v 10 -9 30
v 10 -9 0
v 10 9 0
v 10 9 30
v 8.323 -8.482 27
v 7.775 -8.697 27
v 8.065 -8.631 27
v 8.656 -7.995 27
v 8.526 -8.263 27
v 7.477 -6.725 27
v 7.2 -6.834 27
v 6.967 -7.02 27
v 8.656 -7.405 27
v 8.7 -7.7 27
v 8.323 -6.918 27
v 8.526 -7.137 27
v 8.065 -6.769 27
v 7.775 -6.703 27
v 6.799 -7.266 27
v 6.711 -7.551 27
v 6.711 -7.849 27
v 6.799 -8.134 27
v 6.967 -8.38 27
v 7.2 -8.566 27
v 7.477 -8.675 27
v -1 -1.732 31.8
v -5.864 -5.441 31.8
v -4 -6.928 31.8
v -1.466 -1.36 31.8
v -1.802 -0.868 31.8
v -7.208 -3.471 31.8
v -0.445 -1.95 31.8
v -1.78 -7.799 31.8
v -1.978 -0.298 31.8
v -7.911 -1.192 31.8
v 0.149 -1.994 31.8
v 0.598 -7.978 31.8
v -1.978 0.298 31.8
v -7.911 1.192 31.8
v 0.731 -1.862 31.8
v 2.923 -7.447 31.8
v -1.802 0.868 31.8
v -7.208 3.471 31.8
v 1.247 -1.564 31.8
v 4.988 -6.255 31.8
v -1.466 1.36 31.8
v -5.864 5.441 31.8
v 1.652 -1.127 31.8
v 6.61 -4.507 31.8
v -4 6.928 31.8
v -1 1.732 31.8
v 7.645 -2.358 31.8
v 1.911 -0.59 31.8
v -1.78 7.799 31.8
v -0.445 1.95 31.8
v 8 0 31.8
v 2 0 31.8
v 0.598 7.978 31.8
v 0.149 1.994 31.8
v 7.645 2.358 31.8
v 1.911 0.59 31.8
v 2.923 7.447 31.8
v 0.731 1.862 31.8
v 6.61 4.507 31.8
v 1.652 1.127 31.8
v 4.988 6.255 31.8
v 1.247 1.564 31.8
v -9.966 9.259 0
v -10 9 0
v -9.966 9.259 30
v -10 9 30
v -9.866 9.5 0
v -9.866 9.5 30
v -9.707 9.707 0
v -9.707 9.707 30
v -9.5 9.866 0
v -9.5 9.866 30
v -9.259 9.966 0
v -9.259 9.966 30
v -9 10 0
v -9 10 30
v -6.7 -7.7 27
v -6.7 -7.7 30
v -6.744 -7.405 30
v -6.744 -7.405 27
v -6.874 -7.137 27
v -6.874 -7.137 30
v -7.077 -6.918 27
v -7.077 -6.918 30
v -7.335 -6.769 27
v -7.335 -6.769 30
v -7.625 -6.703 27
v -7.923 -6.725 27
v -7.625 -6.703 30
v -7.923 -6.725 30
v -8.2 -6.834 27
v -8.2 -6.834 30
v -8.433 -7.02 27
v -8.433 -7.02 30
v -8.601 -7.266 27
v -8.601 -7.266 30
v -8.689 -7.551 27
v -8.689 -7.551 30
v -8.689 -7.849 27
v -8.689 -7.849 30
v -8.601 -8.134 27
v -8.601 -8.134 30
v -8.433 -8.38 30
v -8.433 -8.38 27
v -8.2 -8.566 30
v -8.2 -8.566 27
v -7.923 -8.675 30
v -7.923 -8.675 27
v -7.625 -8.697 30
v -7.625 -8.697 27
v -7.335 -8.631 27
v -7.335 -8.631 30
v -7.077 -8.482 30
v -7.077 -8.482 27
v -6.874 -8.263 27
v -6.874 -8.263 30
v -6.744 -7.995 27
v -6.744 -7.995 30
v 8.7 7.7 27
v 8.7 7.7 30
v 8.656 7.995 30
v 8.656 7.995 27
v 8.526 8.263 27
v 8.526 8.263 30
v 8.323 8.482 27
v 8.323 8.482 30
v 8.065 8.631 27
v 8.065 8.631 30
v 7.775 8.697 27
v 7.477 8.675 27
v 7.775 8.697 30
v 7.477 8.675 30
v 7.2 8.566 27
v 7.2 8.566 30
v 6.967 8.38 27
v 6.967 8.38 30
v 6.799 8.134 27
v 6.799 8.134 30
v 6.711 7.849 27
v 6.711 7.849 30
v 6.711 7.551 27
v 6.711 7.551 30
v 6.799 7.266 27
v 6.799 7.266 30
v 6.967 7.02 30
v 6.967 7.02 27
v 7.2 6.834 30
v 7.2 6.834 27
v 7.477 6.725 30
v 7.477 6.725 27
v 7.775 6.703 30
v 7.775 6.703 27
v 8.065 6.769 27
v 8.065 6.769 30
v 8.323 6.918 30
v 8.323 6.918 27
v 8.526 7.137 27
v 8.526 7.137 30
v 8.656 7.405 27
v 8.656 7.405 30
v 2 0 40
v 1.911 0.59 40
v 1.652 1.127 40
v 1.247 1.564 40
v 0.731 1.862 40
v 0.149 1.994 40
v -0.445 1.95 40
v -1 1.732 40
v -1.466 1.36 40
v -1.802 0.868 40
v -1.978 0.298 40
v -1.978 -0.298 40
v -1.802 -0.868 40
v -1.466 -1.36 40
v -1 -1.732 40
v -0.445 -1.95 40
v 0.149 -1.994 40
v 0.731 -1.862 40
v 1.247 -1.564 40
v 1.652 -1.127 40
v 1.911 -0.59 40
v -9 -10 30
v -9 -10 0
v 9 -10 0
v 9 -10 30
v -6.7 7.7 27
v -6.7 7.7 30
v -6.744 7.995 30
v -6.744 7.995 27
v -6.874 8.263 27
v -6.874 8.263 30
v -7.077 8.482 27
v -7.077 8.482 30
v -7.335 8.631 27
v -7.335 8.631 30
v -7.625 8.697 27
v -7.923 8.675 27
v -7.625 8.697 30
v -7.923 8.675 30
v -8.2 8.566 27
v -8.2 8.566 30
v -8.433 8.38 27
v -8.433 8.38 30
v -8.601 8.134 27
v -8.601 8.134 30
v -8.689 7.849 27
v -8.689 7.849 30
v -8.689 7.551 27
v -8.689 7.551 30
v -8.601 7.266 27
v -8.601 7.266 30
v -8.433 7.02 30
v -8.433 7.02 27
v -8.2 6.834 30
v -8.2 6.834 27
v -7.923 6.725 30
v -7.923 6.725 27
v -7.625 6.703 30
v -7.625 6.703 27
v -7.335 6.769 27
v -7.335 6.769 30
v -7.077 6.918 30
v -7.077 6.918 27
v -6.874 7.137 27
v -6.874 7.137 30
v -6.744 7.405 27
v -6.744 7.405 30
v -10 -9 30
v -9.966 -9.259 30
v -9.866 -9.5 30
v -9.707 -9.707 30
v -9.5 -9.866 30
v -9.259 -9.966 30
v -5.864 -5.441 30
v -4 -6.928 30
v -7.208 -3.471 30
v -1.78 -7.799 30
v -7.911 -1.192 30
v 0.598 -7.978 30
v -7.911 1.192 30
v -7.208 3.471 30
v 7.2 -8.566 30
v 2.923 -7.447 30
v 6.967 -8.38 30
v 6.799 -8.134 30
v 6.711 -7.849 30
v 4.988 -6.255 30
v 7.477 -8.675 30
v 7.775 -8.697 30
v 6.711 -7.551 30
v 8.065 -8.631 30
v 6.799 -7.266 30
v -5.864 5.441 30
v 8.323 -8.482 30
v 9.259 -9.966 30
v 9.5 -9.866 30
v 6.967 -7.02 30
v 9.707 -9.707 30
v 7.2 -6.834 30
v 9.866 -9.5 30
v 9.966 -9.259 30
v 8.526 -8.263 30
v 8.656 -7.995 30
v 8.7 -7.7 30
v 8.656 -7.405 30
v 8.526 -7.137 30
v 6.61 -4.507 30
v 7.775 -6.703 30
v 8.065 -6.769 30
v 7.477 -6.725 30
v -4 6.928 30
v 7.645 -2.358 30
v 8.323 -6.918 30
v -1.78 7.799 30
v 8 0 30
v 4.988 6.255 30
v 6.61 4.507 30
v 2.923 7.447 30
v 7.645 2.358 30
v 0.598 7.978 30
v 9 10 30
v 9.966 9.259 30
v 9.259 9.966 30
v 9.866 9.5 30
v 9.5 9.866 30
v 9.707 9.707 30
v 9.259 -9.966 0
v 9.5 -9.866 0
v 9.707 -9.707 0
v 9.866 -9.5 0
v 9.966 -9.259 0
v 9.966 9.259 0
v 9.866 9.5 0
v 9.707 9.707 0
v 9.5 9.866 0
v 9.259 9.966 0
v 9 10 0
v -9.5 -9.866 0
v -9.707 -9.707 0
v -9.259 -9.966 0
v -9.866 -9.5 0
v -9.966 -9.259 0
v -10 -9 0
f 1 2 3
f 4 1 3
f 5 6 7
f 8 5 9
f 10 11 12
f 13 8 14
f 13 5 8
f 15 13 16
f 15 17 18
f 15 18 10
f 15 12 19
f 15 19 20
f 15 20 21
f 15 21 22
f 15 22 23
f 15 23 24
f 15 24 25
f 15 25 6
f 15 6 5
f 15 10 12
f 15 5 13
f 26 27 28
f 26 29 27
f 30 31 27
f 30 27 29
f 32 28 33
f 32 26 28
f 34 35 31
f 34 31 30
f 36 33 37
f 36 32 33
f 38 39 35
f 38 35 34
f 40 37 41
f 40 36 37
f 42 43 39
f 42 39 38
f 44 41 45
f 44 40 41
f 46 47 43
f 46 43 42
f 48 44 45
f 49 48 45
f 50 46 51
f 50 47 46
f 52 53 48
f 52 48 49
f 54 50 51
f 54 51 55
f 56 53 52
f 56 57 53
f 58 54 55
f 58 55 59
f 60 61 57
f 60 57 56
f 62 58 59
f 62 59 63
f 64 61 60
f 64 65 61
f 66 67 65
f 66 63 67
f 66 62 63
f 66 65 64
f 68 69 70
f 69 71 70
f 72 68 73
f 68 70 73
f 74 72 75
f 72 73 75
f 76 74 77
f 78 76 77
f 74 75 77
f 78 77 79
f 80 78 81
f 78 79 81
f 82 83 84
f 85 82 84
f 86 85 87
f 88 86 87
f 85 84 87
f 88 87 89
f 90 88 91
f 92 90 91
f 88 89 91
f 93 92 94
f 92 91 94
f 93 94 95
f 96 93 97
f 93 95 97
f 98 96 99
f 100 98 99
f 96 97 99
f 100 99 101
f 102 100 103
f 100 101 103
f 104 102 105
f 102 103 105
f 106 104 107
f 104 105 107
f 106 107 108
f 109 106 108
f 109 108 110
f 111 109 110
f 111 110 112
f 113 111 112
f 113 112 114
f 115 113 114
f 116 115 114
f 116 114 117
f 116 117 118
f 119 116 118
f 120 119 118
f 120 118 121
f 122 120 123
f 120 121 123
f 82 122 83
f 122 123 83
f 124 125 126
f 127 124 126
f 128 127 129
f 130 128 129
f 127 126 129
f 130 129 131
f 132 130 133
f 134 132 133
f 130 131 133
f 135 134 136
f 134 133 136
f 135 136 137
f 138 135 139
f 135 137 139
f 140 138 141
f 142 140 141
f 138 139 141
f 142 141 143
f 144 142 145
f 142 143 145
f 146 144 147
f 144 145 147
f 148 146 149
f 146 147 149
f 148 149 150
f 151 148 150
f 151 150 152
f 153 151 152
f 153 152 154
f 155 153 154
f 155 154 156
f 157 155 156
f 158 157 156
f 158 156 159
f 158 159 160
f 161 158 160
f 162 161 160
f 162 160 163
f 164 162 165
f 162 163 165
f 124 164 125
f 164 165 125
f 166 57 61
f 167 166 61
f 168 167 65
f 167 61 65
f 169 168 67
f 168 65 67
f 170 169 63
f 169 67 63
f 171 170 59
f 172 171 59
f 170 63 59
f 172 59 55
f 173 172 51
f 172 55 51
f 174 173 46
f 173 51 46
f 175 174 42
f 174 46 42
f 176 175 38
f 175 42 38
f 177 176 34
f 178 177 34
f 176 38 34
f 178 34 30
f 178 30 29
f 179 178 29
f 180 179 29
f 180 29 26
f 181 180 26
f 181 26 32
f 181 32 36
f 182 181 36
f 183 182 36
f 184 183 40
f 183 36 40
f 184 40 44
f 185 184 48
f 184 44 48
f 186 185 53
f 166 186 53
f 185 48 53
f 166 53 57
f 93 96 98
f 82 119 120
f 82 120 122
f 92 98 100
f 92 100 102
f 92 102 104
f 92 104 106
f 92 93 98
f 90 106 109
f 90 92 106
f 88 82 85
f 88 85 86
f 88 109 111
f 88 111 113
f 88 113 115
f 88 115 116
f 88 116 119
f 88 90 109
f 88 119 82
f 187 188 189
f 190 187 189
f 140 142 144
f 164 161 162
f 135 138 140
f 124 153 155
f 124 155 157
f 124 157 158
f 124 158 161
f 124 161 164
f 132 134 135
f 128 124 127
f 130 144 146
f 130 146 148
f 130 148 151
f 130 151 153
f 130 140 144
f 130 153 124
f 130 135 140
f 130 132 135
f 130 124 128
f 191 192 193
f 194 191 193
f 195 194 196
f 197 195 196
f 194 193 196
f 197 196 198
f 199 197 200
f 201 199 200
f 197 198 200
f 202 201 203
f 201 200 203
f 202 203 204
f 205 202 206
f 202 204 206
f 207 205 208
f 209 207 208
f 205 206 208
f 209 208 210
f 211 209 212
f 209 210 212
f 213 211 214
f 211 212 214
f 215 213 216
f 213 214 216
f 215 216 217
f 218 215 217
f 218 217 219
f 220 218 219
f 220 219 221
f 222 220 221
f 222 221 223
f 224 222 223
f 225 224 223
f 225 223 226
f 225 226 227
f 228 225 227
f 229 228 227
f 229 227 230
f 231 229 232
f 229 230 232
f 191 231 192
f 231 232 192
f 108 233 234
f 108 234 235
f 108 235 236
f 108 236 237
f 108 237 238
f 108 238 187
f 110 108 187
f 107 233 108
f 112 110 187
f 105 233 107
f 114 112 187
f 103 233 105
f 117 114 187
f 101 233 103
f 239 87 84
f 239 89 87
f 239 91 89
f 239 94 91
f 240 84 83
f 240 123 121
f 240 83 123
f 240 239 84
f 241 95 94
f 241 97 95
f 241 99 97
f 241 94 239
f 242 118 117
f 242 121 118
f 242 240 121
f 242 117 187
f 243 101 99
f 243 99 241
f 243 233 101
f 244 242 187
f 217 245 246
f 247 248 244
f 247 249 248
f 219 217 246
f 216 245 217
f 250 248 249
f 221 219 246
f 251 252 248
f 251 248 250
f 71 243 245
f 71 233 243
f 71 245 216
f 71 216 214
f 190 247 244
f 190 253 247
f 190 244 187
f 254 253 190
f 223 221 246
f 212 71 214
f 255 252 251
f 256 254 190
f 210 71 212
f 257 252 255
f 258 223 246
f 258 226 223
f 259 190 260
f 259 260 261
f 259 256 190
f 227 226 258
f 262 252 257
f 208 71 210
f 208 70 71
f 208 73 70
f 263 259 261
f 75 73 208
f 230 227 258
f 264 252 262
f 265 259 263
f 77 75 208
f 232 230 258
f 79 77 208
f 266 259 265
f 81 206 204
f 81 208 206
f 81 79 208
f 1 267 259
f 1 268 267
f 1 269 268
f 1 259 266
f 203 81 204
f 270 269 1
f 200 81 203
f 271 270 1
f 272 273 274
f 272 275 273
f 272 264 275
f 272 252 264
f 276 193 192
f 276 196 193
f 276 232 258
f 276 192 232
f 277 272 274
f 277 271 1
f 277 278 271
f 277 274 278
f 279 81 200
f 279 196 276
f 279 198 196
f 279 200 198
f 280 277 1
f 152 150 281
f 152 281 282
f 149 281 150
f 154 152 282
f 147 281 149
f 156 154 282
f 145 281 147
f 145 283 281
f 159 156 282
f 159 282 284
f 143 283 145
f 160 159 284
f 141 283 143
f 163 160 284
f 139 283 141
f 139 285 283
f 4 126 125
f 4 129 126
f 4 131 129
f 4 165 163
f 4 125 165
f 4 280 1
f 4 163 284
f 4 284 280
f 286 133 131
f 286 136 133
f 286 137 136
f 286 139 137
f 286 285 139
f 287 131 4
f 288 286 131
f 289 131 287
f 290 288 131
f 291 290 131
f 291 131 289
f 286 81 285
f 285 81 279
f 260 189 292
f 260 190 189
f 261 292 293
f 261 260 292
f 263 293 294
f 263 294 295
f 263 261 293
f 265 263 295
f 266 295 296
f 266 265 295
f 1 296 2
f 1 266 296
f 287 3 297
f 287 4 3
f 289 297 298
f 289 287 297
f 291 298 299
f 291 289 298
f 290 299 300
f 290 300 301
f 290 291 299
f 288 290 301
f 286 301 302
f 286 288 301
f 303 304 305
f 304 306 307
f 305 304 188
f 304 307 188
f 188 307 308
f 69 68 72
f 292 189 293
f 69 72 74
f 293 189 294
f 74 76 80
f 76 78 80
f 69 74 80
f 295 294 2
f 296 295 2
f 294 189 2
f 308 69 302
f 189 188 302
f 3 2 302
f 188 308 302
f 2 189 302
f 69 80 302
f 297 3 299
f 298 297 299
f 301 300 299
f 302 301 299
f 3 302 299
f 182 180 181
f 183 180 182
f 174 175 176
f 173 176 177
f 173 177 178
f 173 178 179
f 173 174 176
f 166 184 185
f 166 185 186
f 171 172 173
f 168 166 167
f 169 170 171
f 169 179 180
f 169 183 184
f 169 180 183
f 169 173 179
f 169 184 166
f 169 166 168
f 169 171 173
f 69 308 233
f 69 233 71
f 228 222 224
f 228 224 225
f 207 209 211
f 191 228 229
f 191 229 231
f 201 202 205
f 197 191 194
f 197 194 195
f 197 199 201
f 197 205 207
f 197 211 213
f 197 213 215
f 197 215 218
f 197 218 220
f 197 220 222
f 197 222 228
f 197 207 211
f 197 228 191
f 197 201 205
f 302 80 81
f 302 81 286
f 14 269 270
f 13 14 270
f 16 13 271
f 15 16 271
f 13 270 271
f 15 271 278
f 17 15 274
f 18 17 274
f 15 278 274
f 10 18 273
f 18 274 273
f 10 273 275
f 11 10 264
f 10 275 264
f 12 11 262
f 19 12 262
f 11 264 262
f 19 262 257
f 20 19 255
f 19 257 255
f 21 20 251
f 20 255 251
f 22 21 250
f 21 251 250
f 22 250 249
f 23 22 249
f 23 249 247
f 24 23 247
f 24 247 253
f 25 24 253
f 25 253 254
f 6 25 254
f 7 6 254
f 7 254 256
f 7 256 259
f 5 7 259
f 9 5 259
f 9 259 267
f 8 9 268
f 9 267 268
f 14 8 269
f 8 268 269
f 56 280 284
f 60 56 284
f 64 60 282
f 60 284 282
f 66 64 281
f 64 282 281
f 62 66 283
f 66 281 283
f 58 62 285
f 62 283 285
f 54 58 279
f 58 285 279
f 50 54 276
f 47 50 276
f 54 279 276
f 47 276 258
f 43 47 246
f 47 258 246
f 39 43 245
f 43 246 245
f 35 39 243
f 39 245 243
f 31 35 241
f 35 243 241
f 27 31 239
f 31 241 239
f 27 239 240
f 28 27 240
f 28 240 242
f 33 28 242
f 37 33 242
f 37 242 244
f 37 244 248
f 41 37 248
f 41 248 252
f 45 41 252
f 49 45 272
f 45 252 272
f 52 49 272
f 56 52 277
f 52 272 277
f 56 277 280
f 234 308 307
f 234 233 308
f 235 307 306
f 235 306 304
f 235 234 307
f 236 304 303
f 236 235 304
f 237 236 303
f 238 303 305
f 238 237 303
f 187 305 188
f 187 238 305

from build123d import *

# Parameters (mm, degrees)
SKETCH1_W           = 20
SKETCH1_H           = 20
BOSS_EXTRUDE1_DEPTH = 30
FILLET1_R           = 1
SKETCH2_R           = 8
BOSS_EXTRUDE2_DEPTH = 1.8
SKETCH3_R           = 2
BOSS_EXTRUDE3_DEPTH = 8.2
SKETCH4_R           = 1
CUT_EXTRUDE1_DEPTH  = 3


with BuildPart() as part:
    # Sketch1 → Boss-Extrude1 (new body)
    with BuildSketch(Plane.XY):
        Rectangle(SKETCH1_W, SKETCH1_H)
    extrude(amount=BOSS_EXTRUDE1_DEPTH)

    # Fillet1
    fillet1_edges = [part.edges().sort_by_distance(p)[0] for p in [
        (10, -10, 15),
        (-10, -10, 15),
        (-10, 10, 15),
        (10, 10, 15),
    ]]
    fillet(fillet1_edges, radius=FILLET1_R)

    # Sketch2 → Boss-Extrude2 (add)
    with BuildSketch(Plane.XY.offset(30)):
        Circle(SKETCH2_R)
    extrude(amount=BOSS_EXTRUDE2_DEPTH)

    # Sketch3 → Boss-Extrude3 (add)
    with BuildSketch(Plane.XY.offset(31.8)):
        Circle(SKETCH3_R)
    extrude(amount=BOSS_EXTRUDE3_DEPTH)

    # Sketch4 → Cut-Extrude1 (cut)
    with BuildSketch(Plane.XY.offset(30)):
        with Locations((-7.7, 7.7)):
            Circle(SKETCH4_R)
        with Locations((7.7, 7.7)):
            Circle(SKETCH4_R)
        with Locations((7.7, -7.7)):
            Circle(SKETCH4_R)
        with Locations((-7.7, -7.7)):
            Circle(SKETCH4_R)
    extrude(amount=-CUT_EXTRUDE1_DEPTH, mode=Mode.SUBTRACT)


solid = part.part
